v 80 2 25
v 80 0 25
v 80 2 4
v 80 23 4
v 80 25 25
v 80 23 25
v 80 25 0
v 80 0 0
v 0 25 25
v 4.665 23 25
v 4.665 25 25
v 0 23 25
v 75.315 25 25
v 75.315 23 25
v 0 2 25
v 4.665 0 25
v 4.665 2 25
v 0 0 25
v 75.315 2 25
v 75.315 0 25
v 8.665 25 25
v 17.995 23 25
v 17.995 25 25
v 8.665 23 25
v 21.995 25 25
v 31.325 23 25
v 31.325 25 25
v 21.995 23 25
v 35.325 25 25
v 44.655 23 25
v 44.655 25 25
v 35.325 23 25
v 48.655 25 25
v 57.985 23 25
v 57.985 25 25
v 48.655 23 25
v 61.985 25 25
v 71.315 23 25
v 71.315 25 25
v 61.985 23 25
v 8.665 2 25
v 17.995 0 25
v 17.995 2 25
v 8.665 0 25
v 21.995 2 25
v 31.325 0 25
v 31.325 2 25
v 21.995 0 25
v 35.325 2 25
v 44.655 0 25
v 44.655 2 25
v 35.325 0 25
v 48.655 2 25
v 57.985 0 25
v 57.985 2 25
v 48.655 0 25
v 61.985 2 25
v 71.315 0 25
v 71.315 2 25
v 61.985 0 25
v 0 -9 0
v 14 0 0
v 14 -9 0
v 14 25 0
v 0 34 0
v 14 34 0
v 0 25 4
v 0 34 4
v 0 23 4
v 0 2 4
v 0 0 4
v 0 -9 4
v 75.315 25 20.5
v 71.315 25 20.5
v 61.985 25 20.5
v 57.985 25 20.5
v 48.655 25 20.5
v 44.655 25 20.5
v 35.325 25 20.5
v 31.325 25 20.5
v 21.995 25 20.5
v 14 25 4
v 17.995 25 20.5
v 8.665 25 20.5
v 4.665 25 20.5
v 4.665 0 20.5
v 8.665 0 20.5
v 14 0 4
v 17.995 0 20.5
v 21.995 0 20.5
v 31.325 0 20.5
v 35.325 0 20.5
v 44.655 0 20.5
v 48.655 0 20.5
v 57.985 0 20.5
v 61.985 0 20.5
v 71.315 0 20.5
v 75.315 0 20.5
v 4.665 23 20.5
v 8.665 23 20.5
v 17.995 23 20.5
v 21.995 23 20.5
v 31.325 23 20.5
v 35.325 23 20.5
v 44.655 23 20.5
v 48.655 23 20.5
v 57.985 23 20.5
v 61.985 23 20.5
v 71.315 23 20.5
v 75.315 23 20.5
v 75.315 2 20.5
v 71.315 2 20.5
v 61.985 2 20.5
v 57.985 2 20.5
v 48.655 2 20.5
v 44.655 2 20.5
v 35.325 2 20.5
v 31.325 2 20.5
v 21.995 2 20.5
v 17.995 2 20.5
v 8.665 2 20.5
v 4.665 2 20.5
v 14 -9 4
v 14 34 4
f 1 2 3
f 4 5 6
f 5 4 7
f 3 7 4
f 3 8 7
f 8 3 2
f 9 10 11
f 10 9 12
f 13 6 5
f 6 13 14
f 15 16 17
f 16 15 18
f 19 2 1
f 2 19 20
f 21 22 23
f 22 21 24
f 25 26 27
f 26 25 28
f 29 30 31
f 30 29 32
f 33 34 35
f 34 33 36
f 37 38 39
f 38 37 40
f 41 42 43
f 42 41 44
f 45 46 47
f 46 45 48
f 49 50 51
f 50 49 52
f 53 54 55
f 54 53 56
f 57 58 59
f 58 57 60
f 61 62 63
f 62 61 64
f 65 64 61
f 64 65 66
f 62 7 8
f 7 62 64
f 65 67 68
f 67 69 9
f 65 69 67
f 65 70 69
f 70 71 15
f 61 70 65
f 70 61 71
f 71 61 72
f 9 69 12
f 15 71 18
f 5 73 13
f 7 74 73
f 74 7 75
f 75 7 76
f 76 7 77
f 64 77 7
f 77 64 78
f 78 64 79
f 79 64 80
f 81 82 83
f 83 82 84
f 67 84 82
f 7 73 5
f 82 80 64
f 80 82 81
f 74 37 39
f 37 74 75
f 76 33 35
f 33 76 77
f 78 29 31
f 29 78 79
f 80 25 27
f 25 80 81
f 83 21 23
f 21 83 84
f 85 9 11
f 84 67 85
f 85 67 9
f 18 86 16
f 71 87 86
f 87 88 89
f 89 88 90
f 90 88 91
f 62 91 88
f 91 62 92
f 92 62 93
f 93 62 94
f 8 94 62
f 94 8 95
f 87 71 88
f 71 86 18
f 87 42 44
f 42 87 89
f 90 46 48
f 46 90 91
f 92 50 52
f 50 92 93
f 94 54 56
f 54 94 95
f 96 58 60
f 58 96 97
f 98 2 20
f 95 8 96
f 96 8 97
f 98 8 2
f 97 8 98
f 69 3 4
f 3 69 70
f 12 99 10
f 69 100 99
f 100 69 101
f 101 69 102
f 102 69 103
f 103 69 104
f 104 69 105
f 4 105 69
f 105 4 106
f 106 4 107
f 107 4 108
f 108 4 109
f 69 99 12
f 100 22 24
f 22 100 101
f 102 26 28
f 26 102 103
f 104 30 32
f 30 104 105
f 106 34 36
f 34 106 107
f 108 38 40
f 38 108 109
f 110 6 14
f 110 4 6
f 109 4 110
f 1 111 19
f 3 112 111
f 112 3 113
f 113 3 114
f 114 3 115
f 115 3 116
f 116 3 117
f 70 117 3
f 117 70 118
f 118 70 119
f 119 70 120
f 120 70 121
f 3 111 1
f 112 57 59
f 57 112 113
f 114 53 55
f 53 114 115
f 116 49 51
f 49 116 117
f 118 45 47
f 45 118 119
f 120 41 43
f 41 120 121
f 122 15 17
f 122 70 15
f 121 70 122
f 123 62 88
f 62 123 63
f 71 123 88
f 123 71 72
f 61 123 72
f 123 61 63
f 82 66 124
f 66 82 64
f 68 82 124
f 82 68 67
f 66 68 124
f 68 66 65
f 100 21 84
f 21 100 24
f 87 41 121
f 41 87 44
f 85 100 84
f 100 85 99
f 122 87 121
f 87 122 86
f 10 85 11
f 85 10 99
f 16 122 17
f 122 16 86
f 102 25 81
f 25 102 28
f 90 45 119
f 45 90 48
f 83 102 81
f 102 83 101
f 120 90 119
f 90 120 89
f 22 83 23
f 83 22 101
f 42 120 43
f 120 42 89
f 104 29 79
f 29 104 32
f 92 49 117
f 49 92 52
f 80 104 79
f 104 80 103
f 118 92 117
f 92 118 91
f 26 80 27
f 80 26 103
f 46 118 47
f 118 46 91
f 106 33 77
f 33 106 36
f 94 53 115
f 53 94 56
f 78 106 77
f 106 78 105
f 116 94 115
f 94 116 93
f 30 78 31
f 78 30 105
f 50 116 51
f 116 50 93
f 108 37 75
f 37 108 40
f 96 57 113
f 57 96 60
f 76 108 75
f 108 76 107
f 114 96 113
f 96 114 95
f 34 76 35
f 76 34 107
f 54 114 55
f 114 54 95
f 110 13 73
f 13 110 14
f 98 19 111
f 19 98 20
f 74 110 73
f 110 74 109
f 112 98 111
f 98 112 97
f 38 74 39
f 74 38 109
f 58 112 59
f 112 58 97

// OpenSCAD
$fn = 32;

// ----------------------------------------------------------------------
// Cable duct: 80 x 25 x 25 mm, 6 fingers
// ----------------------------------------------------------------------

// --- parameters (mm) ---
channel_l = 80;           // duct length, X
channel_w = 25;           // duct width, Y
channel_h = 25;           // duct height, Z
channel_t = 2;            // side wall thickness
floor_t = 4;              // floor thickness
slot_w = 4;               // finger slot width
slot_h = 16.5;            // finger slot height
fingers = 6;              // number of finger slots per side
pitch = 13.33;            // finger pitch
ear_w = 10;               // mounting ear width
ear_l = 14;               // mounting ear length

module shell() {
  difference() {
    cube([channel_l, channel_w, channel_h]);
    /* open top channel */
    translate([-channel_t - 1, channel_t, floor_t])
      cube([channel_l + 2 * channel_t + 2, channel_w - 2 * channel_t, channel_h + 1]);
  }
}

module ears() {
  translate([0, -ear_w + 1, 0]) cube([ear_l, ear_w, floor_t]);
  translate([0, channel_w - 1, 0]) cube([ear_l, ear_w, floor_t]);
}

difference() {
  union() {
    shell();
    ears();
  }
  /* finger slots cut through both side walls */
  for (i = [0 : fingers - 1]) translate([pitch / 2 + i * pitch - slot_w / 2, -1, floor_t + slot_h]) cube([slot_w, channel_w + 2, channel_h]);
}
